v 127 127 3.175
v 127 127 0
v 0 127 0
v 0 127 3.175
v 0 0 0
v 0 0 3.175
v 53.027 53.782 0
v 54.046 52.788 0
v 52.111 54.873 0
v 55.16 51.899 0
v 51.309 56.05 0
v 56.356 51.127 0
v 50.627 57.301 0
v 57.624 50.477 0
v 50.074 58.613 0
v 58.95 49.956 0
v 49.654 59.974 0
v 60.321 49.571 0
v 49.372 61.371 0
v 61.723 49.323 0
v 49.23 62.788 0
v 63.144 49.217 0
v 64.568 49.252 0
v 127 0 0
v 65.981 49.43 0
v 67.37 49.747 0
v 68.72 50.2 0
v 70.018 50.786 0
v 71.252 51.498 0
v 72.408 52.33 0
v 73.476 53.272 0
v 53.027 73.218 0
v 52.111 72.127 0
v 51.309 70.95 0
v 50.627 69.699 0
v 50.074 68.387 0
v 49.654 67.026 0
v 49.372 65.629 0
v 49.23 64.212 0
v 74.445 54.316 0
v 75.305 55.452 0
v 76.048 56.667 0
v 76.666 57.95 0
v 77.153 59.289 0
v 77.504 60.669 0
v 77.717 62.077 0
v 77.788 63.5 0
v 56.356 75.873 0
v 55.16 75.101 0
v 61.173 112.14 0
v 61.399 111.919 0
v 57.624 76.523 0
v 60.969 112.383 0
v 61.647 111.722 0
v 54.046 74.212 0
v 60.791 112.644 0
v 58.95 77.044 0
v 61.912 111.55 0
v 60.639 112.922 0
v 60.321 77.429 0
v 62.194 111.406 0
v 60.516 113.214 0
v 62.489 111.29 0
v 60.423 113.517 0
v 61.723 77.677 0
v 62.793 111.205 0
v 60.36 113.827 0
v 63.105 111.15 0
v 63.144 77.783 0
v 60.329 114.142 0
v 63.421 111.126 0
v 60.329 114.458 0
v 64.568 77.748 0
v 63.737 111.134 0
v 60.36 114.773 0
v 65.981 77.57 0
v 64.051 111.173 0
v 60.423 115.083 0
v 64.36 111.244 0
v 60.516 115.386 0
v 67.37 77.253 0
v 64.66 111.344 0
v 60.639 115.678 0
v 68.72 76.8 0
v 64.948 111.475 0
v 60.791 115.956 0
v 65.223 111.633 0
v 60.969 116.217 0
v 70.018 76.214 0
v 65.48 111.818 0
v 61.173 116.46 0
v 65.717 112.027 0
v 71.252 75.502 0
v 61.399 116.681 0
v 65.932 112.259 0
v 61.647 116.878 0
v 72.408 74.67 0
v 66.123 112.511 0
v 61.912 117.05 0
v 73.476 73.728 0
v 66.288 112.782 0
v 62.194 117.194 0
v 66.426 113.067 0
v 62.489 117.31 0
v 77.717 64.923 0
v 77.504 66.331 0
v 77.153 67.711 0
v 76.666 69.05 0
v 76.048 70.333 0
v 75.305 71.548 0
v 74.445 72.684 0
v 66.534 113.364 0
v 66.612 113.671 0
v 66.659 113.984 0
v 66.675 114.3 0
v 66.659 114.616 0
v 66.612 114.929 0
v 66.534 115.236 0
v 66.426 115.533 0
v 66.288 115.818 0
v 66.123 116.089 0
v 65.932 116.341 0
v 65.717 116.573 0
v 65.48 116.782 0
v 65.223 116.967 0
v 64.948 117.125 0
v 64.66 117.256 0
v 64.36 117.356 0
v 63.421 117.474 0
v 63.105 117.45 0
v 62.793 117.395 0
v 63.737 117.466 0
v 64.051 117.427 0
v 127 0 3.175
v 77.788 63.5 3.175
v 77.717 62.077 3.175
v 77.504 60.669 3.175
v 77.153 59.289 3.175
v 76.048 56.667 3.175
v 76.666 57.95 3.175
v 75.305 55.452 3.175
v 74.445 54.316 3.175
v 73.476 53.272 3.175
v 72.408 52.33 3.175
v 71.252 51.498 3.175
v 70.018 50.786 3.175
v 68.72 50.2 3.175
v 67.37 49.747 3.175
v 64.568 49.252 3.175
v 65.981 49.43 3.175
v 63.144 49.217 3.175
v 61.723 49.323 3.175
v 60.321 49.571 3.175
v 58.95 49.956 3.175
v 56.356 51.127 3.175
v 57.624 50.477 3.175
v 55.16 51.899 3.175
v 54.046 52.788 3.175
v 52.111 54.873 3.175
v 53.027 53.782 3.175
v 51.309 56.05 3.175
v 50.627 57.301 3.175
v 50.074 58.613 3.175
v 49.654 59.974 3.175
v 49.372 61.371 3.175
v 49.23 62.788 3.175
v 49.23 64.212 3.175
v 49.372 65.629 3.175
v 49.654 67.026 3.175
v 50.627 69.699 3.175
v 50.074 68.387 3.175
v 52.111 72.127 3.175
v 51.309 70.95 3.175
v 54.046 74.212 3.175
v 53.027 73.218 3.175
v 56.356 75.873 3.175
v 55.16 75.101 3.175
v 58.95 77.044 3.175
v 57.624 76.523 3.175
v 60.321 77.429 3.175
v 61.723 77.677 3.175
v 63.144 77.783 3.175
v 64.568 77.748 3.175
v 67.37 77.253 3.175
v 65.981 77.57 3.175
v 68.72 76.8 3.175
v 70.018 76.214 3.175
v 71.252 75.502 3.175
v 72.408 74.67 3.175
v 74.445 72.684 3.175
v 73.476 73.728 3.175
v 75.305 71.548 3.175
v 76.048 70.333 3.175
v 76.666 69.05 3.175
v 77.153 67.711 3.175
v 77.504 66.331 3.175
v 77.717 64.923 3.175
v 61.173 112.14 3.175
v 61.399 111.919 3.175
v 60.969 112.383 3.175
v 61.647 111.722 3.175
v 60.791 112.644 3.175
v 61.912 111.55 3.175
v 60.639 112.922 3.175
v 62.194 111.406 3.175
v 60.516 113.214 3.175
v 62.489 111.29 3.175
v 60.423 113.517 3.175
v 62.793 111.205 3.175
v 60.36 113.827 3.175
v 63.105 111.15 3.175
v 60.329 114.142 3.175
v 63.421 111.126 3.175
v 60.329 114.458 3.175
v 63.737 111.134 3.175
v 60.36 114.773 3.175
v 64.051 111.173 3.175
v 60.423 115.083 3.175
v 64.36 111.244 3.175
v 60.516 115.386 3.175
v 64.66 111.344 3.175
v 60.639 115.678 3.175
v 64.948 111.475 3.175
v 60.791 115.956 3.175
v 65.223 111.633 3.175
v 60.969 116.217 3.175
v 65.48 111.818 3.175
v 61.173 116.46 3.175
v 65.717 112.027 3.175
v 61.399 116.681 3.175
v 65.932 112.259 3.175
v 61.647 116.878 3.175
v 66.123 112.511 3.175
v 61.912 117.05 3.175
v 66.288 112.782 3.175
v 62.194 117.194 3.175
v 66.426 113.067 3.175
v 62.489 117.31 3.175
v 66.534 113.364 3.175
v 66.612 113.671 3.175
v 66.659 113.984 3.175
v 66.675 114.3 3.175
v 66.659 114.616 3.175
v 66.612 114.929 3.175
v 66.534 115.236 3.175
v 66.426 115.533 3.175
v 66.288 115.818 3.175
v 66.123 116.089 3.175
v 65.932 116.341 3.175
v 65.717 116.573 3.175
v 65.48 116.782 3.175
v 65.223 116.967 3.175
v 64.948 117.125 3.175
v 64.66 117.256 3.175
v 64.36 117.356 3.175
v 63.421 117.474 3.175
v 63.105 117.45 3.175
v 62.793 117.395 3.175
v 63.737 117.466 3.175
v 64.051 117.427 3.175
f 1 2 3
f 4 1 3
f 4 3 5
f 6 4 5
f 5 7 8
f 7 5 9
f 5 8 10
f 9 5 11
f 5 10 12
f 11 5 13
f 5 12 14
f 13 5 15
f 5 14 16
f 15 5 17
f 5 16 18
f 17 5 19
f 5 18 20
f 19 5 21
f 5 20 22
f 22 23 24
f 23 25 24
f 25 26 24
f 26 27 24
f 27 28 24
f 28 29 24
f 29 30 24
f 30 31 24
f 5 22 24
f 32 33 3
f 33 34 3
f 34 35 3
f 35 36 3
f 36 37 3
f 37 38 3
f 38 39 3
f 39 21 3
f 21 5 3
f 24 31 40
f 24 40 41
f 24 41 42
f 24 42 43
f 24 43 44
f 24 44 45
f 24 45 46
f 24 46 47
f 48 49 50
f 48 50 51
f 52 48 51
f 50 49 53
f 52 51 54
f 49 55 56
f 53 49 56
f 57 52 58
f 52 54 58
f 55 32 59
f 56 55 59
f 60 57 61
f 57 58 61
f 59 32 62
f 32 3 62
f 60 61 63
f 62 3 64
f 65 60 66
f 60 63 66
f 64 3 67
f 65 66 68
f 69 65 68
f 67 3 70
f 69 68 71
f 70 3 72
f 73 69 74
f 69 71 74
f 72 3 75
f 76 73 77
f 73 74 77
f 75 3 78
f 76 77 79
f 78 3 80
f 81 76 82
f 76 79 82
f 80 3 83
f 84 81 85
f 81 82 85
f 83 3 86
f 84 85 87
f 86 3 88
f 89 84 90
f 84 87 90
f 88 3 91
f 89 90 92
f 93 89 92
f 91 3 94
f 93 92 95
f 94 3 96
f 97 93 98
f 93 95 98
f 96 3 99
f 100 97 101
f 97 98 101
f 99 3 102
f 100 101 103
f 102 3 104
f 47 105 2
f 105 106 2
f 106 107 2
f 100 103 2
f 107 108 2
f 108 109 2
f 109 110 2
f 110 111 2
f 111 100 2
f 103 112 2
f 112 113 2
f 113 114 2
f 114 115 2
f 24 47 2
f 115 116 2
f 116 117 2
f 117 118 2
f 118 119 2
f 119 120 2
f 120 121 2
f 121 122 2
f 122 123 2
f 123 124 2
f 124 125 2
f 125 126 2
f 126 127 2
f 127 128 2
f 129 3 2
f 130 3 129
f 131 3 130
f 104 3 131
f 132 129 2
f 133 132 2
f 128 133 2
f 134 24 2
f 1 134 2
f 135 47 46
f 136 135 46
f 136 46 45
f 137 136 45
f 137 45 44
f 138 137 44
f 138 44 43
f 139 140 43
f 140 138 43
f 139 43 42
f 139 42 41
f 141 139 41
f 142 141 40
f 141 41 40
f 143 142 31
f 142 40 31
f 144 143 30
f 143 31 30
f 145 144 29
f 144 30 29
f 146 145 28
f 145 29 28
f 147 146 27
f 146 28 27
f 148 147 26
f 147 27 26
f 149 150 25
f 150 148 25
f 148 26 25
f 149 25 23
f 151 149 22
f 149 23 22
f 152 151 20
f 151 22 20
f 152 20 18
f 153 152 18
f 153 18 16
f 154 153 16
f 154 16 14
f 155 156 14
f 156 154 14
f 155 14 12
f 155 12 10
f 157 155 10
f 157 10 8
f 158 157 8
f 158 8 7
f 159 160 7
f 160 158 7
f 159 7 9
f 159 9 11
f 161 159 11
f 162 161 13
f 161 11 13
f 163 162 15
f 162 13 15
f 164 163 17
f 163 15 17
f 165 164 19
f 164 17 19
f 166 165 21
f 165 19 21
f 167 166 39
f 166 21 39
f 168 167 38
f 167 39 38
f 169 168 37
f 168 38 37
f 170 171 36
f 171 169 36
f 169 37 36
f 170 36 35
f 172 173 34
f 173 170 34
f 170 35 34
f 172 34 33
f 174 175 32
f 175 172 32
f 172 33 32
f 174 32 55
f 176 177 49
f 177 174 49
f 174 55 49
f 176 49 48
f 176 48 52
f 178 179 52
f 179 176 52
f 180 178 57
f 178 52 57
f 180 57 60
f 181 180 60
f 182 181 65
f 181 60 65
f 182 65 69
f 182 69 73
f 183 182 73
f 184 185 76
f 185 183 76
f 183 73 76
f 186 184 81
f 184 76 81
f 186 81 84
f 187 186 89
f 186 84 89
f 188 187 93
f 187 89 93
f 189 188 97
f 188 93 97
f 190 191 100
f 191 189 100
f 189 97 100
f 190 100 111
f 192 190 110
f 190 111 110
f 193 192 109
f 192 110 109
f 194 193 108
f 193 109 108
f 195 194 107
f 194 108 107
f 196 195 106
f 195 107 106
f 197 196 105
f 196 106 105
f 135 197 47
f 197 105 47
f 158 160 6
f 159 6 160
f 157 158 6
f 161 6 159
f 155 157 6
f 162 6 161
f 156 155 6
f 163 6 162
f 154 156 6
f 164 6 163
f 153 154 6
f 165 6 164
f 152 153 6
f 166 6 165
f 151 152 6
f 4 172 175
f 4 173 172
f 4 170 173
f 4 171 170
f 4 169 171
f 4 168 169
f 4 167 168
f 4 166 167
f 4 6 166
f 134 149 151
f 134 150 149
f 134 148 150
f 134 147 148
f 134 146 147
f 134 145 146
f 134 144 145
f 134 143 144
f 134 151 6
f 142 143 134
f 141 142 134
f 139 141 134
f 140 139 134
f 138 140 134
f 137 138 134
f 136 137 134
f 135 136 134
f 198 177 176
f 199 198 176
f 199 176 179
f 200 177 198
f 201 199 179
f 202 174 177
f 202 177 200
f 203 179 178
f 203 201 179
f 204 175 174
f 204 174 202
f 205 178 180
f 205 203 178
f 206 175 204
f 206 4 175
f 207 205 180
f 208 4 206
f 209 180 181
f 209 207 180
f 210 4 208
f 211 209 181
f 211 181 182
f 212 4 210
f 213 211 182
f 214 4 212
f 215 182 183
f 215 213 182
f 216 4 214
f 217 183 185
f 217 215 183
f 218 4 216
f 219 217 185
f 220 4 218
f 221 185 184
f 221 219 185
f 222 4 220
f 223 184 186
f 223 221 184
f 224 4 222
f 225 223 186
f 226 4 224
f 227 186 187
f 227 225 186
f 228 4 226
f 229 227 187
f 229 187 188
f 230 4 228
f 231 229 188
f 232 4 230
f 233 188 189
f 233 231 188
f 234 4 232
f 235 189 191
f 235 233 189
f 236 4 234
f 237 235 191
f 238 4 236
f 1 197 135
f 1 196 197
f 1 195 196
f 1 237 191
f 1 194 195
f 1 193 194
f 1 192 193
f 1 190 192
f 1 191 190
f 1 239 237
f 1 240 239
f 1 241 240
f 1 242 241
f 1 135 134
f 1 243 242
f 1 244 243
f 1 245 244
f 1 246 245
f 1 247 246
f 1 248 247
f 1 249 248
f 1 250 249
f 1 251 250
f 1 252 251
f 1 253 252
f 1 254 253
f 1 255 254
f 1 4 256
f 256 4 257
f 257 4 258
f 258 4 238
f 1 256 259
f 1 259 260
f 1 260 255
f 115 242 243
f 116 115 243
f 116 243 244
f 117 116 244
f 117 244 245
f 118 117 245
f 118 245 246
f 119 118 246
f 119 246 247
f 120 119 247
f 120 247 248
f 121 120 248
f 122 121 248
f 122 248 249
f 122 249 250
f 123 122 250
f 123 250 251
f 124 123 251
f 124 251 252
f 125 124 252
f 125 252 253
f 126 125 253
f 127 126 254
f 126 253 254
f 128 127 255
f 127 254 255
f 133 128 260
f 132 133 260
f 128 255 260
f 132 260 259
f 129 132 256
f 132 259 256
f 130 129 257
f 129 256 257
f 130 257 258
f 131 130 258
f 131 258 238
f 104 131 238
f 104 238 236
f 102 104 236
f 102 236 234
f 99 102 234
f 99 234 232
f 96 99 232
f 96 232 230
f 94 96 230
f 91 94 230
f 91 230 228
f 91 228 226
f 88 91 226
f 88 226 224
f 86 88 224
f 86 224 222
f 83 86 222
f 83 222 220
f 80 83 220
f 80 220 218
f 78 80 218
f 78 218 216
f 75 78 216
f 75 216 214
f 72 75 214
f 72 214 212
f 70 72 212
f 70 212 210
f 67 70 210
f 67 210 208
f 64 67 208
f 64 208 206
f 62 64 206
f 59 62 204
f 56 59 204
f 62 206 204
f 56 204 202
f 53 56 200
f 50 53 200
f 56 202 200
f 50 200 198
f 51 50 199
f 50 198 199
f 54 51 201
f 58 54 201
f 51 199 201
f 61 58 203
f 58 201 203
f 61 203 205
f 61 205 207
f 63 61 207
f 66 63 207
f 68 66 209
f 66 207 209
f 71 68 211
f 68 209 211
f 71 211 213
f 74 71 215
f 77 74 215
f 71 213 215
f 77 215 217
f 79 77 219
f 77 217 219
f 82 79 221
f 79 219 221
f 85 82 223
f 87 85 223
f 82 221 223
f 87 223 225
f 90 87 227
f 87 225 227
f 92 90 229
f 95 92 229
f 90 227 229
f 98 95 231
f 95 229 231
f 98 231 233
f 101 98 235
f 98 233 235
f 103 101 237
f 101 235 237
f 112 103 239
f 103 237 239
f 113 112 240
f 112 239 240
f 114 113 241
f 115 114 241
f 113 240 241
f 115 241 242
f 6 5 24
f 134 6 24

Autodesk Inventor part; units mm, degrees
ref_plane "YZ Plane" through (0, 0, 0) normal (1, 0, 0) x (0, 1, 0)
ref_plane "XZ Plane" through (0, 0, 0) normal (0, 1, 0) x (-1, 0, 0)
ref_plane "XY Plane" through (0, 0, 0) normal (0, 0, 1) x (1, 0, 0)
sketch "Sketch1" plane through (0, 0, 0) normal (0, 0, 1) x (1, 0, 0)
  line L0 (0, 0) -> (127, 0)
  line L1 (127, 0) -> (127, 127)
  line L2 (127, 127) -> (0, 127)
  line L3 (0, 127) -> (0, 0)
  circle A0 centre (63.5, 63.5) radius 14.2875
  dimension "d0" = 127
  dimension "d1" = 127
  dimension "d2" = 28.575
extrude "Extrusion1" add sketch "Sketch1" along normal blind 3.175
sketch "Sketch2" plane through (0, 0, 3.175) normal (0, 0, 1) x (1, 0, 0)
  circle A0 centre (63.5, 114.3) radius 3.175
  line L0 (0, 127) -> (0, 0) projected
  line L1 (127, 127) -> (0, 127) projected
  dimension "d5" = 6.35
  dimension "d6" = 63.5
  dimension "d7" = 12.7
extrude "Extrusion2" cut sketch "Sketch2" against normal blind 3.175
properties part number "TestPlate"
